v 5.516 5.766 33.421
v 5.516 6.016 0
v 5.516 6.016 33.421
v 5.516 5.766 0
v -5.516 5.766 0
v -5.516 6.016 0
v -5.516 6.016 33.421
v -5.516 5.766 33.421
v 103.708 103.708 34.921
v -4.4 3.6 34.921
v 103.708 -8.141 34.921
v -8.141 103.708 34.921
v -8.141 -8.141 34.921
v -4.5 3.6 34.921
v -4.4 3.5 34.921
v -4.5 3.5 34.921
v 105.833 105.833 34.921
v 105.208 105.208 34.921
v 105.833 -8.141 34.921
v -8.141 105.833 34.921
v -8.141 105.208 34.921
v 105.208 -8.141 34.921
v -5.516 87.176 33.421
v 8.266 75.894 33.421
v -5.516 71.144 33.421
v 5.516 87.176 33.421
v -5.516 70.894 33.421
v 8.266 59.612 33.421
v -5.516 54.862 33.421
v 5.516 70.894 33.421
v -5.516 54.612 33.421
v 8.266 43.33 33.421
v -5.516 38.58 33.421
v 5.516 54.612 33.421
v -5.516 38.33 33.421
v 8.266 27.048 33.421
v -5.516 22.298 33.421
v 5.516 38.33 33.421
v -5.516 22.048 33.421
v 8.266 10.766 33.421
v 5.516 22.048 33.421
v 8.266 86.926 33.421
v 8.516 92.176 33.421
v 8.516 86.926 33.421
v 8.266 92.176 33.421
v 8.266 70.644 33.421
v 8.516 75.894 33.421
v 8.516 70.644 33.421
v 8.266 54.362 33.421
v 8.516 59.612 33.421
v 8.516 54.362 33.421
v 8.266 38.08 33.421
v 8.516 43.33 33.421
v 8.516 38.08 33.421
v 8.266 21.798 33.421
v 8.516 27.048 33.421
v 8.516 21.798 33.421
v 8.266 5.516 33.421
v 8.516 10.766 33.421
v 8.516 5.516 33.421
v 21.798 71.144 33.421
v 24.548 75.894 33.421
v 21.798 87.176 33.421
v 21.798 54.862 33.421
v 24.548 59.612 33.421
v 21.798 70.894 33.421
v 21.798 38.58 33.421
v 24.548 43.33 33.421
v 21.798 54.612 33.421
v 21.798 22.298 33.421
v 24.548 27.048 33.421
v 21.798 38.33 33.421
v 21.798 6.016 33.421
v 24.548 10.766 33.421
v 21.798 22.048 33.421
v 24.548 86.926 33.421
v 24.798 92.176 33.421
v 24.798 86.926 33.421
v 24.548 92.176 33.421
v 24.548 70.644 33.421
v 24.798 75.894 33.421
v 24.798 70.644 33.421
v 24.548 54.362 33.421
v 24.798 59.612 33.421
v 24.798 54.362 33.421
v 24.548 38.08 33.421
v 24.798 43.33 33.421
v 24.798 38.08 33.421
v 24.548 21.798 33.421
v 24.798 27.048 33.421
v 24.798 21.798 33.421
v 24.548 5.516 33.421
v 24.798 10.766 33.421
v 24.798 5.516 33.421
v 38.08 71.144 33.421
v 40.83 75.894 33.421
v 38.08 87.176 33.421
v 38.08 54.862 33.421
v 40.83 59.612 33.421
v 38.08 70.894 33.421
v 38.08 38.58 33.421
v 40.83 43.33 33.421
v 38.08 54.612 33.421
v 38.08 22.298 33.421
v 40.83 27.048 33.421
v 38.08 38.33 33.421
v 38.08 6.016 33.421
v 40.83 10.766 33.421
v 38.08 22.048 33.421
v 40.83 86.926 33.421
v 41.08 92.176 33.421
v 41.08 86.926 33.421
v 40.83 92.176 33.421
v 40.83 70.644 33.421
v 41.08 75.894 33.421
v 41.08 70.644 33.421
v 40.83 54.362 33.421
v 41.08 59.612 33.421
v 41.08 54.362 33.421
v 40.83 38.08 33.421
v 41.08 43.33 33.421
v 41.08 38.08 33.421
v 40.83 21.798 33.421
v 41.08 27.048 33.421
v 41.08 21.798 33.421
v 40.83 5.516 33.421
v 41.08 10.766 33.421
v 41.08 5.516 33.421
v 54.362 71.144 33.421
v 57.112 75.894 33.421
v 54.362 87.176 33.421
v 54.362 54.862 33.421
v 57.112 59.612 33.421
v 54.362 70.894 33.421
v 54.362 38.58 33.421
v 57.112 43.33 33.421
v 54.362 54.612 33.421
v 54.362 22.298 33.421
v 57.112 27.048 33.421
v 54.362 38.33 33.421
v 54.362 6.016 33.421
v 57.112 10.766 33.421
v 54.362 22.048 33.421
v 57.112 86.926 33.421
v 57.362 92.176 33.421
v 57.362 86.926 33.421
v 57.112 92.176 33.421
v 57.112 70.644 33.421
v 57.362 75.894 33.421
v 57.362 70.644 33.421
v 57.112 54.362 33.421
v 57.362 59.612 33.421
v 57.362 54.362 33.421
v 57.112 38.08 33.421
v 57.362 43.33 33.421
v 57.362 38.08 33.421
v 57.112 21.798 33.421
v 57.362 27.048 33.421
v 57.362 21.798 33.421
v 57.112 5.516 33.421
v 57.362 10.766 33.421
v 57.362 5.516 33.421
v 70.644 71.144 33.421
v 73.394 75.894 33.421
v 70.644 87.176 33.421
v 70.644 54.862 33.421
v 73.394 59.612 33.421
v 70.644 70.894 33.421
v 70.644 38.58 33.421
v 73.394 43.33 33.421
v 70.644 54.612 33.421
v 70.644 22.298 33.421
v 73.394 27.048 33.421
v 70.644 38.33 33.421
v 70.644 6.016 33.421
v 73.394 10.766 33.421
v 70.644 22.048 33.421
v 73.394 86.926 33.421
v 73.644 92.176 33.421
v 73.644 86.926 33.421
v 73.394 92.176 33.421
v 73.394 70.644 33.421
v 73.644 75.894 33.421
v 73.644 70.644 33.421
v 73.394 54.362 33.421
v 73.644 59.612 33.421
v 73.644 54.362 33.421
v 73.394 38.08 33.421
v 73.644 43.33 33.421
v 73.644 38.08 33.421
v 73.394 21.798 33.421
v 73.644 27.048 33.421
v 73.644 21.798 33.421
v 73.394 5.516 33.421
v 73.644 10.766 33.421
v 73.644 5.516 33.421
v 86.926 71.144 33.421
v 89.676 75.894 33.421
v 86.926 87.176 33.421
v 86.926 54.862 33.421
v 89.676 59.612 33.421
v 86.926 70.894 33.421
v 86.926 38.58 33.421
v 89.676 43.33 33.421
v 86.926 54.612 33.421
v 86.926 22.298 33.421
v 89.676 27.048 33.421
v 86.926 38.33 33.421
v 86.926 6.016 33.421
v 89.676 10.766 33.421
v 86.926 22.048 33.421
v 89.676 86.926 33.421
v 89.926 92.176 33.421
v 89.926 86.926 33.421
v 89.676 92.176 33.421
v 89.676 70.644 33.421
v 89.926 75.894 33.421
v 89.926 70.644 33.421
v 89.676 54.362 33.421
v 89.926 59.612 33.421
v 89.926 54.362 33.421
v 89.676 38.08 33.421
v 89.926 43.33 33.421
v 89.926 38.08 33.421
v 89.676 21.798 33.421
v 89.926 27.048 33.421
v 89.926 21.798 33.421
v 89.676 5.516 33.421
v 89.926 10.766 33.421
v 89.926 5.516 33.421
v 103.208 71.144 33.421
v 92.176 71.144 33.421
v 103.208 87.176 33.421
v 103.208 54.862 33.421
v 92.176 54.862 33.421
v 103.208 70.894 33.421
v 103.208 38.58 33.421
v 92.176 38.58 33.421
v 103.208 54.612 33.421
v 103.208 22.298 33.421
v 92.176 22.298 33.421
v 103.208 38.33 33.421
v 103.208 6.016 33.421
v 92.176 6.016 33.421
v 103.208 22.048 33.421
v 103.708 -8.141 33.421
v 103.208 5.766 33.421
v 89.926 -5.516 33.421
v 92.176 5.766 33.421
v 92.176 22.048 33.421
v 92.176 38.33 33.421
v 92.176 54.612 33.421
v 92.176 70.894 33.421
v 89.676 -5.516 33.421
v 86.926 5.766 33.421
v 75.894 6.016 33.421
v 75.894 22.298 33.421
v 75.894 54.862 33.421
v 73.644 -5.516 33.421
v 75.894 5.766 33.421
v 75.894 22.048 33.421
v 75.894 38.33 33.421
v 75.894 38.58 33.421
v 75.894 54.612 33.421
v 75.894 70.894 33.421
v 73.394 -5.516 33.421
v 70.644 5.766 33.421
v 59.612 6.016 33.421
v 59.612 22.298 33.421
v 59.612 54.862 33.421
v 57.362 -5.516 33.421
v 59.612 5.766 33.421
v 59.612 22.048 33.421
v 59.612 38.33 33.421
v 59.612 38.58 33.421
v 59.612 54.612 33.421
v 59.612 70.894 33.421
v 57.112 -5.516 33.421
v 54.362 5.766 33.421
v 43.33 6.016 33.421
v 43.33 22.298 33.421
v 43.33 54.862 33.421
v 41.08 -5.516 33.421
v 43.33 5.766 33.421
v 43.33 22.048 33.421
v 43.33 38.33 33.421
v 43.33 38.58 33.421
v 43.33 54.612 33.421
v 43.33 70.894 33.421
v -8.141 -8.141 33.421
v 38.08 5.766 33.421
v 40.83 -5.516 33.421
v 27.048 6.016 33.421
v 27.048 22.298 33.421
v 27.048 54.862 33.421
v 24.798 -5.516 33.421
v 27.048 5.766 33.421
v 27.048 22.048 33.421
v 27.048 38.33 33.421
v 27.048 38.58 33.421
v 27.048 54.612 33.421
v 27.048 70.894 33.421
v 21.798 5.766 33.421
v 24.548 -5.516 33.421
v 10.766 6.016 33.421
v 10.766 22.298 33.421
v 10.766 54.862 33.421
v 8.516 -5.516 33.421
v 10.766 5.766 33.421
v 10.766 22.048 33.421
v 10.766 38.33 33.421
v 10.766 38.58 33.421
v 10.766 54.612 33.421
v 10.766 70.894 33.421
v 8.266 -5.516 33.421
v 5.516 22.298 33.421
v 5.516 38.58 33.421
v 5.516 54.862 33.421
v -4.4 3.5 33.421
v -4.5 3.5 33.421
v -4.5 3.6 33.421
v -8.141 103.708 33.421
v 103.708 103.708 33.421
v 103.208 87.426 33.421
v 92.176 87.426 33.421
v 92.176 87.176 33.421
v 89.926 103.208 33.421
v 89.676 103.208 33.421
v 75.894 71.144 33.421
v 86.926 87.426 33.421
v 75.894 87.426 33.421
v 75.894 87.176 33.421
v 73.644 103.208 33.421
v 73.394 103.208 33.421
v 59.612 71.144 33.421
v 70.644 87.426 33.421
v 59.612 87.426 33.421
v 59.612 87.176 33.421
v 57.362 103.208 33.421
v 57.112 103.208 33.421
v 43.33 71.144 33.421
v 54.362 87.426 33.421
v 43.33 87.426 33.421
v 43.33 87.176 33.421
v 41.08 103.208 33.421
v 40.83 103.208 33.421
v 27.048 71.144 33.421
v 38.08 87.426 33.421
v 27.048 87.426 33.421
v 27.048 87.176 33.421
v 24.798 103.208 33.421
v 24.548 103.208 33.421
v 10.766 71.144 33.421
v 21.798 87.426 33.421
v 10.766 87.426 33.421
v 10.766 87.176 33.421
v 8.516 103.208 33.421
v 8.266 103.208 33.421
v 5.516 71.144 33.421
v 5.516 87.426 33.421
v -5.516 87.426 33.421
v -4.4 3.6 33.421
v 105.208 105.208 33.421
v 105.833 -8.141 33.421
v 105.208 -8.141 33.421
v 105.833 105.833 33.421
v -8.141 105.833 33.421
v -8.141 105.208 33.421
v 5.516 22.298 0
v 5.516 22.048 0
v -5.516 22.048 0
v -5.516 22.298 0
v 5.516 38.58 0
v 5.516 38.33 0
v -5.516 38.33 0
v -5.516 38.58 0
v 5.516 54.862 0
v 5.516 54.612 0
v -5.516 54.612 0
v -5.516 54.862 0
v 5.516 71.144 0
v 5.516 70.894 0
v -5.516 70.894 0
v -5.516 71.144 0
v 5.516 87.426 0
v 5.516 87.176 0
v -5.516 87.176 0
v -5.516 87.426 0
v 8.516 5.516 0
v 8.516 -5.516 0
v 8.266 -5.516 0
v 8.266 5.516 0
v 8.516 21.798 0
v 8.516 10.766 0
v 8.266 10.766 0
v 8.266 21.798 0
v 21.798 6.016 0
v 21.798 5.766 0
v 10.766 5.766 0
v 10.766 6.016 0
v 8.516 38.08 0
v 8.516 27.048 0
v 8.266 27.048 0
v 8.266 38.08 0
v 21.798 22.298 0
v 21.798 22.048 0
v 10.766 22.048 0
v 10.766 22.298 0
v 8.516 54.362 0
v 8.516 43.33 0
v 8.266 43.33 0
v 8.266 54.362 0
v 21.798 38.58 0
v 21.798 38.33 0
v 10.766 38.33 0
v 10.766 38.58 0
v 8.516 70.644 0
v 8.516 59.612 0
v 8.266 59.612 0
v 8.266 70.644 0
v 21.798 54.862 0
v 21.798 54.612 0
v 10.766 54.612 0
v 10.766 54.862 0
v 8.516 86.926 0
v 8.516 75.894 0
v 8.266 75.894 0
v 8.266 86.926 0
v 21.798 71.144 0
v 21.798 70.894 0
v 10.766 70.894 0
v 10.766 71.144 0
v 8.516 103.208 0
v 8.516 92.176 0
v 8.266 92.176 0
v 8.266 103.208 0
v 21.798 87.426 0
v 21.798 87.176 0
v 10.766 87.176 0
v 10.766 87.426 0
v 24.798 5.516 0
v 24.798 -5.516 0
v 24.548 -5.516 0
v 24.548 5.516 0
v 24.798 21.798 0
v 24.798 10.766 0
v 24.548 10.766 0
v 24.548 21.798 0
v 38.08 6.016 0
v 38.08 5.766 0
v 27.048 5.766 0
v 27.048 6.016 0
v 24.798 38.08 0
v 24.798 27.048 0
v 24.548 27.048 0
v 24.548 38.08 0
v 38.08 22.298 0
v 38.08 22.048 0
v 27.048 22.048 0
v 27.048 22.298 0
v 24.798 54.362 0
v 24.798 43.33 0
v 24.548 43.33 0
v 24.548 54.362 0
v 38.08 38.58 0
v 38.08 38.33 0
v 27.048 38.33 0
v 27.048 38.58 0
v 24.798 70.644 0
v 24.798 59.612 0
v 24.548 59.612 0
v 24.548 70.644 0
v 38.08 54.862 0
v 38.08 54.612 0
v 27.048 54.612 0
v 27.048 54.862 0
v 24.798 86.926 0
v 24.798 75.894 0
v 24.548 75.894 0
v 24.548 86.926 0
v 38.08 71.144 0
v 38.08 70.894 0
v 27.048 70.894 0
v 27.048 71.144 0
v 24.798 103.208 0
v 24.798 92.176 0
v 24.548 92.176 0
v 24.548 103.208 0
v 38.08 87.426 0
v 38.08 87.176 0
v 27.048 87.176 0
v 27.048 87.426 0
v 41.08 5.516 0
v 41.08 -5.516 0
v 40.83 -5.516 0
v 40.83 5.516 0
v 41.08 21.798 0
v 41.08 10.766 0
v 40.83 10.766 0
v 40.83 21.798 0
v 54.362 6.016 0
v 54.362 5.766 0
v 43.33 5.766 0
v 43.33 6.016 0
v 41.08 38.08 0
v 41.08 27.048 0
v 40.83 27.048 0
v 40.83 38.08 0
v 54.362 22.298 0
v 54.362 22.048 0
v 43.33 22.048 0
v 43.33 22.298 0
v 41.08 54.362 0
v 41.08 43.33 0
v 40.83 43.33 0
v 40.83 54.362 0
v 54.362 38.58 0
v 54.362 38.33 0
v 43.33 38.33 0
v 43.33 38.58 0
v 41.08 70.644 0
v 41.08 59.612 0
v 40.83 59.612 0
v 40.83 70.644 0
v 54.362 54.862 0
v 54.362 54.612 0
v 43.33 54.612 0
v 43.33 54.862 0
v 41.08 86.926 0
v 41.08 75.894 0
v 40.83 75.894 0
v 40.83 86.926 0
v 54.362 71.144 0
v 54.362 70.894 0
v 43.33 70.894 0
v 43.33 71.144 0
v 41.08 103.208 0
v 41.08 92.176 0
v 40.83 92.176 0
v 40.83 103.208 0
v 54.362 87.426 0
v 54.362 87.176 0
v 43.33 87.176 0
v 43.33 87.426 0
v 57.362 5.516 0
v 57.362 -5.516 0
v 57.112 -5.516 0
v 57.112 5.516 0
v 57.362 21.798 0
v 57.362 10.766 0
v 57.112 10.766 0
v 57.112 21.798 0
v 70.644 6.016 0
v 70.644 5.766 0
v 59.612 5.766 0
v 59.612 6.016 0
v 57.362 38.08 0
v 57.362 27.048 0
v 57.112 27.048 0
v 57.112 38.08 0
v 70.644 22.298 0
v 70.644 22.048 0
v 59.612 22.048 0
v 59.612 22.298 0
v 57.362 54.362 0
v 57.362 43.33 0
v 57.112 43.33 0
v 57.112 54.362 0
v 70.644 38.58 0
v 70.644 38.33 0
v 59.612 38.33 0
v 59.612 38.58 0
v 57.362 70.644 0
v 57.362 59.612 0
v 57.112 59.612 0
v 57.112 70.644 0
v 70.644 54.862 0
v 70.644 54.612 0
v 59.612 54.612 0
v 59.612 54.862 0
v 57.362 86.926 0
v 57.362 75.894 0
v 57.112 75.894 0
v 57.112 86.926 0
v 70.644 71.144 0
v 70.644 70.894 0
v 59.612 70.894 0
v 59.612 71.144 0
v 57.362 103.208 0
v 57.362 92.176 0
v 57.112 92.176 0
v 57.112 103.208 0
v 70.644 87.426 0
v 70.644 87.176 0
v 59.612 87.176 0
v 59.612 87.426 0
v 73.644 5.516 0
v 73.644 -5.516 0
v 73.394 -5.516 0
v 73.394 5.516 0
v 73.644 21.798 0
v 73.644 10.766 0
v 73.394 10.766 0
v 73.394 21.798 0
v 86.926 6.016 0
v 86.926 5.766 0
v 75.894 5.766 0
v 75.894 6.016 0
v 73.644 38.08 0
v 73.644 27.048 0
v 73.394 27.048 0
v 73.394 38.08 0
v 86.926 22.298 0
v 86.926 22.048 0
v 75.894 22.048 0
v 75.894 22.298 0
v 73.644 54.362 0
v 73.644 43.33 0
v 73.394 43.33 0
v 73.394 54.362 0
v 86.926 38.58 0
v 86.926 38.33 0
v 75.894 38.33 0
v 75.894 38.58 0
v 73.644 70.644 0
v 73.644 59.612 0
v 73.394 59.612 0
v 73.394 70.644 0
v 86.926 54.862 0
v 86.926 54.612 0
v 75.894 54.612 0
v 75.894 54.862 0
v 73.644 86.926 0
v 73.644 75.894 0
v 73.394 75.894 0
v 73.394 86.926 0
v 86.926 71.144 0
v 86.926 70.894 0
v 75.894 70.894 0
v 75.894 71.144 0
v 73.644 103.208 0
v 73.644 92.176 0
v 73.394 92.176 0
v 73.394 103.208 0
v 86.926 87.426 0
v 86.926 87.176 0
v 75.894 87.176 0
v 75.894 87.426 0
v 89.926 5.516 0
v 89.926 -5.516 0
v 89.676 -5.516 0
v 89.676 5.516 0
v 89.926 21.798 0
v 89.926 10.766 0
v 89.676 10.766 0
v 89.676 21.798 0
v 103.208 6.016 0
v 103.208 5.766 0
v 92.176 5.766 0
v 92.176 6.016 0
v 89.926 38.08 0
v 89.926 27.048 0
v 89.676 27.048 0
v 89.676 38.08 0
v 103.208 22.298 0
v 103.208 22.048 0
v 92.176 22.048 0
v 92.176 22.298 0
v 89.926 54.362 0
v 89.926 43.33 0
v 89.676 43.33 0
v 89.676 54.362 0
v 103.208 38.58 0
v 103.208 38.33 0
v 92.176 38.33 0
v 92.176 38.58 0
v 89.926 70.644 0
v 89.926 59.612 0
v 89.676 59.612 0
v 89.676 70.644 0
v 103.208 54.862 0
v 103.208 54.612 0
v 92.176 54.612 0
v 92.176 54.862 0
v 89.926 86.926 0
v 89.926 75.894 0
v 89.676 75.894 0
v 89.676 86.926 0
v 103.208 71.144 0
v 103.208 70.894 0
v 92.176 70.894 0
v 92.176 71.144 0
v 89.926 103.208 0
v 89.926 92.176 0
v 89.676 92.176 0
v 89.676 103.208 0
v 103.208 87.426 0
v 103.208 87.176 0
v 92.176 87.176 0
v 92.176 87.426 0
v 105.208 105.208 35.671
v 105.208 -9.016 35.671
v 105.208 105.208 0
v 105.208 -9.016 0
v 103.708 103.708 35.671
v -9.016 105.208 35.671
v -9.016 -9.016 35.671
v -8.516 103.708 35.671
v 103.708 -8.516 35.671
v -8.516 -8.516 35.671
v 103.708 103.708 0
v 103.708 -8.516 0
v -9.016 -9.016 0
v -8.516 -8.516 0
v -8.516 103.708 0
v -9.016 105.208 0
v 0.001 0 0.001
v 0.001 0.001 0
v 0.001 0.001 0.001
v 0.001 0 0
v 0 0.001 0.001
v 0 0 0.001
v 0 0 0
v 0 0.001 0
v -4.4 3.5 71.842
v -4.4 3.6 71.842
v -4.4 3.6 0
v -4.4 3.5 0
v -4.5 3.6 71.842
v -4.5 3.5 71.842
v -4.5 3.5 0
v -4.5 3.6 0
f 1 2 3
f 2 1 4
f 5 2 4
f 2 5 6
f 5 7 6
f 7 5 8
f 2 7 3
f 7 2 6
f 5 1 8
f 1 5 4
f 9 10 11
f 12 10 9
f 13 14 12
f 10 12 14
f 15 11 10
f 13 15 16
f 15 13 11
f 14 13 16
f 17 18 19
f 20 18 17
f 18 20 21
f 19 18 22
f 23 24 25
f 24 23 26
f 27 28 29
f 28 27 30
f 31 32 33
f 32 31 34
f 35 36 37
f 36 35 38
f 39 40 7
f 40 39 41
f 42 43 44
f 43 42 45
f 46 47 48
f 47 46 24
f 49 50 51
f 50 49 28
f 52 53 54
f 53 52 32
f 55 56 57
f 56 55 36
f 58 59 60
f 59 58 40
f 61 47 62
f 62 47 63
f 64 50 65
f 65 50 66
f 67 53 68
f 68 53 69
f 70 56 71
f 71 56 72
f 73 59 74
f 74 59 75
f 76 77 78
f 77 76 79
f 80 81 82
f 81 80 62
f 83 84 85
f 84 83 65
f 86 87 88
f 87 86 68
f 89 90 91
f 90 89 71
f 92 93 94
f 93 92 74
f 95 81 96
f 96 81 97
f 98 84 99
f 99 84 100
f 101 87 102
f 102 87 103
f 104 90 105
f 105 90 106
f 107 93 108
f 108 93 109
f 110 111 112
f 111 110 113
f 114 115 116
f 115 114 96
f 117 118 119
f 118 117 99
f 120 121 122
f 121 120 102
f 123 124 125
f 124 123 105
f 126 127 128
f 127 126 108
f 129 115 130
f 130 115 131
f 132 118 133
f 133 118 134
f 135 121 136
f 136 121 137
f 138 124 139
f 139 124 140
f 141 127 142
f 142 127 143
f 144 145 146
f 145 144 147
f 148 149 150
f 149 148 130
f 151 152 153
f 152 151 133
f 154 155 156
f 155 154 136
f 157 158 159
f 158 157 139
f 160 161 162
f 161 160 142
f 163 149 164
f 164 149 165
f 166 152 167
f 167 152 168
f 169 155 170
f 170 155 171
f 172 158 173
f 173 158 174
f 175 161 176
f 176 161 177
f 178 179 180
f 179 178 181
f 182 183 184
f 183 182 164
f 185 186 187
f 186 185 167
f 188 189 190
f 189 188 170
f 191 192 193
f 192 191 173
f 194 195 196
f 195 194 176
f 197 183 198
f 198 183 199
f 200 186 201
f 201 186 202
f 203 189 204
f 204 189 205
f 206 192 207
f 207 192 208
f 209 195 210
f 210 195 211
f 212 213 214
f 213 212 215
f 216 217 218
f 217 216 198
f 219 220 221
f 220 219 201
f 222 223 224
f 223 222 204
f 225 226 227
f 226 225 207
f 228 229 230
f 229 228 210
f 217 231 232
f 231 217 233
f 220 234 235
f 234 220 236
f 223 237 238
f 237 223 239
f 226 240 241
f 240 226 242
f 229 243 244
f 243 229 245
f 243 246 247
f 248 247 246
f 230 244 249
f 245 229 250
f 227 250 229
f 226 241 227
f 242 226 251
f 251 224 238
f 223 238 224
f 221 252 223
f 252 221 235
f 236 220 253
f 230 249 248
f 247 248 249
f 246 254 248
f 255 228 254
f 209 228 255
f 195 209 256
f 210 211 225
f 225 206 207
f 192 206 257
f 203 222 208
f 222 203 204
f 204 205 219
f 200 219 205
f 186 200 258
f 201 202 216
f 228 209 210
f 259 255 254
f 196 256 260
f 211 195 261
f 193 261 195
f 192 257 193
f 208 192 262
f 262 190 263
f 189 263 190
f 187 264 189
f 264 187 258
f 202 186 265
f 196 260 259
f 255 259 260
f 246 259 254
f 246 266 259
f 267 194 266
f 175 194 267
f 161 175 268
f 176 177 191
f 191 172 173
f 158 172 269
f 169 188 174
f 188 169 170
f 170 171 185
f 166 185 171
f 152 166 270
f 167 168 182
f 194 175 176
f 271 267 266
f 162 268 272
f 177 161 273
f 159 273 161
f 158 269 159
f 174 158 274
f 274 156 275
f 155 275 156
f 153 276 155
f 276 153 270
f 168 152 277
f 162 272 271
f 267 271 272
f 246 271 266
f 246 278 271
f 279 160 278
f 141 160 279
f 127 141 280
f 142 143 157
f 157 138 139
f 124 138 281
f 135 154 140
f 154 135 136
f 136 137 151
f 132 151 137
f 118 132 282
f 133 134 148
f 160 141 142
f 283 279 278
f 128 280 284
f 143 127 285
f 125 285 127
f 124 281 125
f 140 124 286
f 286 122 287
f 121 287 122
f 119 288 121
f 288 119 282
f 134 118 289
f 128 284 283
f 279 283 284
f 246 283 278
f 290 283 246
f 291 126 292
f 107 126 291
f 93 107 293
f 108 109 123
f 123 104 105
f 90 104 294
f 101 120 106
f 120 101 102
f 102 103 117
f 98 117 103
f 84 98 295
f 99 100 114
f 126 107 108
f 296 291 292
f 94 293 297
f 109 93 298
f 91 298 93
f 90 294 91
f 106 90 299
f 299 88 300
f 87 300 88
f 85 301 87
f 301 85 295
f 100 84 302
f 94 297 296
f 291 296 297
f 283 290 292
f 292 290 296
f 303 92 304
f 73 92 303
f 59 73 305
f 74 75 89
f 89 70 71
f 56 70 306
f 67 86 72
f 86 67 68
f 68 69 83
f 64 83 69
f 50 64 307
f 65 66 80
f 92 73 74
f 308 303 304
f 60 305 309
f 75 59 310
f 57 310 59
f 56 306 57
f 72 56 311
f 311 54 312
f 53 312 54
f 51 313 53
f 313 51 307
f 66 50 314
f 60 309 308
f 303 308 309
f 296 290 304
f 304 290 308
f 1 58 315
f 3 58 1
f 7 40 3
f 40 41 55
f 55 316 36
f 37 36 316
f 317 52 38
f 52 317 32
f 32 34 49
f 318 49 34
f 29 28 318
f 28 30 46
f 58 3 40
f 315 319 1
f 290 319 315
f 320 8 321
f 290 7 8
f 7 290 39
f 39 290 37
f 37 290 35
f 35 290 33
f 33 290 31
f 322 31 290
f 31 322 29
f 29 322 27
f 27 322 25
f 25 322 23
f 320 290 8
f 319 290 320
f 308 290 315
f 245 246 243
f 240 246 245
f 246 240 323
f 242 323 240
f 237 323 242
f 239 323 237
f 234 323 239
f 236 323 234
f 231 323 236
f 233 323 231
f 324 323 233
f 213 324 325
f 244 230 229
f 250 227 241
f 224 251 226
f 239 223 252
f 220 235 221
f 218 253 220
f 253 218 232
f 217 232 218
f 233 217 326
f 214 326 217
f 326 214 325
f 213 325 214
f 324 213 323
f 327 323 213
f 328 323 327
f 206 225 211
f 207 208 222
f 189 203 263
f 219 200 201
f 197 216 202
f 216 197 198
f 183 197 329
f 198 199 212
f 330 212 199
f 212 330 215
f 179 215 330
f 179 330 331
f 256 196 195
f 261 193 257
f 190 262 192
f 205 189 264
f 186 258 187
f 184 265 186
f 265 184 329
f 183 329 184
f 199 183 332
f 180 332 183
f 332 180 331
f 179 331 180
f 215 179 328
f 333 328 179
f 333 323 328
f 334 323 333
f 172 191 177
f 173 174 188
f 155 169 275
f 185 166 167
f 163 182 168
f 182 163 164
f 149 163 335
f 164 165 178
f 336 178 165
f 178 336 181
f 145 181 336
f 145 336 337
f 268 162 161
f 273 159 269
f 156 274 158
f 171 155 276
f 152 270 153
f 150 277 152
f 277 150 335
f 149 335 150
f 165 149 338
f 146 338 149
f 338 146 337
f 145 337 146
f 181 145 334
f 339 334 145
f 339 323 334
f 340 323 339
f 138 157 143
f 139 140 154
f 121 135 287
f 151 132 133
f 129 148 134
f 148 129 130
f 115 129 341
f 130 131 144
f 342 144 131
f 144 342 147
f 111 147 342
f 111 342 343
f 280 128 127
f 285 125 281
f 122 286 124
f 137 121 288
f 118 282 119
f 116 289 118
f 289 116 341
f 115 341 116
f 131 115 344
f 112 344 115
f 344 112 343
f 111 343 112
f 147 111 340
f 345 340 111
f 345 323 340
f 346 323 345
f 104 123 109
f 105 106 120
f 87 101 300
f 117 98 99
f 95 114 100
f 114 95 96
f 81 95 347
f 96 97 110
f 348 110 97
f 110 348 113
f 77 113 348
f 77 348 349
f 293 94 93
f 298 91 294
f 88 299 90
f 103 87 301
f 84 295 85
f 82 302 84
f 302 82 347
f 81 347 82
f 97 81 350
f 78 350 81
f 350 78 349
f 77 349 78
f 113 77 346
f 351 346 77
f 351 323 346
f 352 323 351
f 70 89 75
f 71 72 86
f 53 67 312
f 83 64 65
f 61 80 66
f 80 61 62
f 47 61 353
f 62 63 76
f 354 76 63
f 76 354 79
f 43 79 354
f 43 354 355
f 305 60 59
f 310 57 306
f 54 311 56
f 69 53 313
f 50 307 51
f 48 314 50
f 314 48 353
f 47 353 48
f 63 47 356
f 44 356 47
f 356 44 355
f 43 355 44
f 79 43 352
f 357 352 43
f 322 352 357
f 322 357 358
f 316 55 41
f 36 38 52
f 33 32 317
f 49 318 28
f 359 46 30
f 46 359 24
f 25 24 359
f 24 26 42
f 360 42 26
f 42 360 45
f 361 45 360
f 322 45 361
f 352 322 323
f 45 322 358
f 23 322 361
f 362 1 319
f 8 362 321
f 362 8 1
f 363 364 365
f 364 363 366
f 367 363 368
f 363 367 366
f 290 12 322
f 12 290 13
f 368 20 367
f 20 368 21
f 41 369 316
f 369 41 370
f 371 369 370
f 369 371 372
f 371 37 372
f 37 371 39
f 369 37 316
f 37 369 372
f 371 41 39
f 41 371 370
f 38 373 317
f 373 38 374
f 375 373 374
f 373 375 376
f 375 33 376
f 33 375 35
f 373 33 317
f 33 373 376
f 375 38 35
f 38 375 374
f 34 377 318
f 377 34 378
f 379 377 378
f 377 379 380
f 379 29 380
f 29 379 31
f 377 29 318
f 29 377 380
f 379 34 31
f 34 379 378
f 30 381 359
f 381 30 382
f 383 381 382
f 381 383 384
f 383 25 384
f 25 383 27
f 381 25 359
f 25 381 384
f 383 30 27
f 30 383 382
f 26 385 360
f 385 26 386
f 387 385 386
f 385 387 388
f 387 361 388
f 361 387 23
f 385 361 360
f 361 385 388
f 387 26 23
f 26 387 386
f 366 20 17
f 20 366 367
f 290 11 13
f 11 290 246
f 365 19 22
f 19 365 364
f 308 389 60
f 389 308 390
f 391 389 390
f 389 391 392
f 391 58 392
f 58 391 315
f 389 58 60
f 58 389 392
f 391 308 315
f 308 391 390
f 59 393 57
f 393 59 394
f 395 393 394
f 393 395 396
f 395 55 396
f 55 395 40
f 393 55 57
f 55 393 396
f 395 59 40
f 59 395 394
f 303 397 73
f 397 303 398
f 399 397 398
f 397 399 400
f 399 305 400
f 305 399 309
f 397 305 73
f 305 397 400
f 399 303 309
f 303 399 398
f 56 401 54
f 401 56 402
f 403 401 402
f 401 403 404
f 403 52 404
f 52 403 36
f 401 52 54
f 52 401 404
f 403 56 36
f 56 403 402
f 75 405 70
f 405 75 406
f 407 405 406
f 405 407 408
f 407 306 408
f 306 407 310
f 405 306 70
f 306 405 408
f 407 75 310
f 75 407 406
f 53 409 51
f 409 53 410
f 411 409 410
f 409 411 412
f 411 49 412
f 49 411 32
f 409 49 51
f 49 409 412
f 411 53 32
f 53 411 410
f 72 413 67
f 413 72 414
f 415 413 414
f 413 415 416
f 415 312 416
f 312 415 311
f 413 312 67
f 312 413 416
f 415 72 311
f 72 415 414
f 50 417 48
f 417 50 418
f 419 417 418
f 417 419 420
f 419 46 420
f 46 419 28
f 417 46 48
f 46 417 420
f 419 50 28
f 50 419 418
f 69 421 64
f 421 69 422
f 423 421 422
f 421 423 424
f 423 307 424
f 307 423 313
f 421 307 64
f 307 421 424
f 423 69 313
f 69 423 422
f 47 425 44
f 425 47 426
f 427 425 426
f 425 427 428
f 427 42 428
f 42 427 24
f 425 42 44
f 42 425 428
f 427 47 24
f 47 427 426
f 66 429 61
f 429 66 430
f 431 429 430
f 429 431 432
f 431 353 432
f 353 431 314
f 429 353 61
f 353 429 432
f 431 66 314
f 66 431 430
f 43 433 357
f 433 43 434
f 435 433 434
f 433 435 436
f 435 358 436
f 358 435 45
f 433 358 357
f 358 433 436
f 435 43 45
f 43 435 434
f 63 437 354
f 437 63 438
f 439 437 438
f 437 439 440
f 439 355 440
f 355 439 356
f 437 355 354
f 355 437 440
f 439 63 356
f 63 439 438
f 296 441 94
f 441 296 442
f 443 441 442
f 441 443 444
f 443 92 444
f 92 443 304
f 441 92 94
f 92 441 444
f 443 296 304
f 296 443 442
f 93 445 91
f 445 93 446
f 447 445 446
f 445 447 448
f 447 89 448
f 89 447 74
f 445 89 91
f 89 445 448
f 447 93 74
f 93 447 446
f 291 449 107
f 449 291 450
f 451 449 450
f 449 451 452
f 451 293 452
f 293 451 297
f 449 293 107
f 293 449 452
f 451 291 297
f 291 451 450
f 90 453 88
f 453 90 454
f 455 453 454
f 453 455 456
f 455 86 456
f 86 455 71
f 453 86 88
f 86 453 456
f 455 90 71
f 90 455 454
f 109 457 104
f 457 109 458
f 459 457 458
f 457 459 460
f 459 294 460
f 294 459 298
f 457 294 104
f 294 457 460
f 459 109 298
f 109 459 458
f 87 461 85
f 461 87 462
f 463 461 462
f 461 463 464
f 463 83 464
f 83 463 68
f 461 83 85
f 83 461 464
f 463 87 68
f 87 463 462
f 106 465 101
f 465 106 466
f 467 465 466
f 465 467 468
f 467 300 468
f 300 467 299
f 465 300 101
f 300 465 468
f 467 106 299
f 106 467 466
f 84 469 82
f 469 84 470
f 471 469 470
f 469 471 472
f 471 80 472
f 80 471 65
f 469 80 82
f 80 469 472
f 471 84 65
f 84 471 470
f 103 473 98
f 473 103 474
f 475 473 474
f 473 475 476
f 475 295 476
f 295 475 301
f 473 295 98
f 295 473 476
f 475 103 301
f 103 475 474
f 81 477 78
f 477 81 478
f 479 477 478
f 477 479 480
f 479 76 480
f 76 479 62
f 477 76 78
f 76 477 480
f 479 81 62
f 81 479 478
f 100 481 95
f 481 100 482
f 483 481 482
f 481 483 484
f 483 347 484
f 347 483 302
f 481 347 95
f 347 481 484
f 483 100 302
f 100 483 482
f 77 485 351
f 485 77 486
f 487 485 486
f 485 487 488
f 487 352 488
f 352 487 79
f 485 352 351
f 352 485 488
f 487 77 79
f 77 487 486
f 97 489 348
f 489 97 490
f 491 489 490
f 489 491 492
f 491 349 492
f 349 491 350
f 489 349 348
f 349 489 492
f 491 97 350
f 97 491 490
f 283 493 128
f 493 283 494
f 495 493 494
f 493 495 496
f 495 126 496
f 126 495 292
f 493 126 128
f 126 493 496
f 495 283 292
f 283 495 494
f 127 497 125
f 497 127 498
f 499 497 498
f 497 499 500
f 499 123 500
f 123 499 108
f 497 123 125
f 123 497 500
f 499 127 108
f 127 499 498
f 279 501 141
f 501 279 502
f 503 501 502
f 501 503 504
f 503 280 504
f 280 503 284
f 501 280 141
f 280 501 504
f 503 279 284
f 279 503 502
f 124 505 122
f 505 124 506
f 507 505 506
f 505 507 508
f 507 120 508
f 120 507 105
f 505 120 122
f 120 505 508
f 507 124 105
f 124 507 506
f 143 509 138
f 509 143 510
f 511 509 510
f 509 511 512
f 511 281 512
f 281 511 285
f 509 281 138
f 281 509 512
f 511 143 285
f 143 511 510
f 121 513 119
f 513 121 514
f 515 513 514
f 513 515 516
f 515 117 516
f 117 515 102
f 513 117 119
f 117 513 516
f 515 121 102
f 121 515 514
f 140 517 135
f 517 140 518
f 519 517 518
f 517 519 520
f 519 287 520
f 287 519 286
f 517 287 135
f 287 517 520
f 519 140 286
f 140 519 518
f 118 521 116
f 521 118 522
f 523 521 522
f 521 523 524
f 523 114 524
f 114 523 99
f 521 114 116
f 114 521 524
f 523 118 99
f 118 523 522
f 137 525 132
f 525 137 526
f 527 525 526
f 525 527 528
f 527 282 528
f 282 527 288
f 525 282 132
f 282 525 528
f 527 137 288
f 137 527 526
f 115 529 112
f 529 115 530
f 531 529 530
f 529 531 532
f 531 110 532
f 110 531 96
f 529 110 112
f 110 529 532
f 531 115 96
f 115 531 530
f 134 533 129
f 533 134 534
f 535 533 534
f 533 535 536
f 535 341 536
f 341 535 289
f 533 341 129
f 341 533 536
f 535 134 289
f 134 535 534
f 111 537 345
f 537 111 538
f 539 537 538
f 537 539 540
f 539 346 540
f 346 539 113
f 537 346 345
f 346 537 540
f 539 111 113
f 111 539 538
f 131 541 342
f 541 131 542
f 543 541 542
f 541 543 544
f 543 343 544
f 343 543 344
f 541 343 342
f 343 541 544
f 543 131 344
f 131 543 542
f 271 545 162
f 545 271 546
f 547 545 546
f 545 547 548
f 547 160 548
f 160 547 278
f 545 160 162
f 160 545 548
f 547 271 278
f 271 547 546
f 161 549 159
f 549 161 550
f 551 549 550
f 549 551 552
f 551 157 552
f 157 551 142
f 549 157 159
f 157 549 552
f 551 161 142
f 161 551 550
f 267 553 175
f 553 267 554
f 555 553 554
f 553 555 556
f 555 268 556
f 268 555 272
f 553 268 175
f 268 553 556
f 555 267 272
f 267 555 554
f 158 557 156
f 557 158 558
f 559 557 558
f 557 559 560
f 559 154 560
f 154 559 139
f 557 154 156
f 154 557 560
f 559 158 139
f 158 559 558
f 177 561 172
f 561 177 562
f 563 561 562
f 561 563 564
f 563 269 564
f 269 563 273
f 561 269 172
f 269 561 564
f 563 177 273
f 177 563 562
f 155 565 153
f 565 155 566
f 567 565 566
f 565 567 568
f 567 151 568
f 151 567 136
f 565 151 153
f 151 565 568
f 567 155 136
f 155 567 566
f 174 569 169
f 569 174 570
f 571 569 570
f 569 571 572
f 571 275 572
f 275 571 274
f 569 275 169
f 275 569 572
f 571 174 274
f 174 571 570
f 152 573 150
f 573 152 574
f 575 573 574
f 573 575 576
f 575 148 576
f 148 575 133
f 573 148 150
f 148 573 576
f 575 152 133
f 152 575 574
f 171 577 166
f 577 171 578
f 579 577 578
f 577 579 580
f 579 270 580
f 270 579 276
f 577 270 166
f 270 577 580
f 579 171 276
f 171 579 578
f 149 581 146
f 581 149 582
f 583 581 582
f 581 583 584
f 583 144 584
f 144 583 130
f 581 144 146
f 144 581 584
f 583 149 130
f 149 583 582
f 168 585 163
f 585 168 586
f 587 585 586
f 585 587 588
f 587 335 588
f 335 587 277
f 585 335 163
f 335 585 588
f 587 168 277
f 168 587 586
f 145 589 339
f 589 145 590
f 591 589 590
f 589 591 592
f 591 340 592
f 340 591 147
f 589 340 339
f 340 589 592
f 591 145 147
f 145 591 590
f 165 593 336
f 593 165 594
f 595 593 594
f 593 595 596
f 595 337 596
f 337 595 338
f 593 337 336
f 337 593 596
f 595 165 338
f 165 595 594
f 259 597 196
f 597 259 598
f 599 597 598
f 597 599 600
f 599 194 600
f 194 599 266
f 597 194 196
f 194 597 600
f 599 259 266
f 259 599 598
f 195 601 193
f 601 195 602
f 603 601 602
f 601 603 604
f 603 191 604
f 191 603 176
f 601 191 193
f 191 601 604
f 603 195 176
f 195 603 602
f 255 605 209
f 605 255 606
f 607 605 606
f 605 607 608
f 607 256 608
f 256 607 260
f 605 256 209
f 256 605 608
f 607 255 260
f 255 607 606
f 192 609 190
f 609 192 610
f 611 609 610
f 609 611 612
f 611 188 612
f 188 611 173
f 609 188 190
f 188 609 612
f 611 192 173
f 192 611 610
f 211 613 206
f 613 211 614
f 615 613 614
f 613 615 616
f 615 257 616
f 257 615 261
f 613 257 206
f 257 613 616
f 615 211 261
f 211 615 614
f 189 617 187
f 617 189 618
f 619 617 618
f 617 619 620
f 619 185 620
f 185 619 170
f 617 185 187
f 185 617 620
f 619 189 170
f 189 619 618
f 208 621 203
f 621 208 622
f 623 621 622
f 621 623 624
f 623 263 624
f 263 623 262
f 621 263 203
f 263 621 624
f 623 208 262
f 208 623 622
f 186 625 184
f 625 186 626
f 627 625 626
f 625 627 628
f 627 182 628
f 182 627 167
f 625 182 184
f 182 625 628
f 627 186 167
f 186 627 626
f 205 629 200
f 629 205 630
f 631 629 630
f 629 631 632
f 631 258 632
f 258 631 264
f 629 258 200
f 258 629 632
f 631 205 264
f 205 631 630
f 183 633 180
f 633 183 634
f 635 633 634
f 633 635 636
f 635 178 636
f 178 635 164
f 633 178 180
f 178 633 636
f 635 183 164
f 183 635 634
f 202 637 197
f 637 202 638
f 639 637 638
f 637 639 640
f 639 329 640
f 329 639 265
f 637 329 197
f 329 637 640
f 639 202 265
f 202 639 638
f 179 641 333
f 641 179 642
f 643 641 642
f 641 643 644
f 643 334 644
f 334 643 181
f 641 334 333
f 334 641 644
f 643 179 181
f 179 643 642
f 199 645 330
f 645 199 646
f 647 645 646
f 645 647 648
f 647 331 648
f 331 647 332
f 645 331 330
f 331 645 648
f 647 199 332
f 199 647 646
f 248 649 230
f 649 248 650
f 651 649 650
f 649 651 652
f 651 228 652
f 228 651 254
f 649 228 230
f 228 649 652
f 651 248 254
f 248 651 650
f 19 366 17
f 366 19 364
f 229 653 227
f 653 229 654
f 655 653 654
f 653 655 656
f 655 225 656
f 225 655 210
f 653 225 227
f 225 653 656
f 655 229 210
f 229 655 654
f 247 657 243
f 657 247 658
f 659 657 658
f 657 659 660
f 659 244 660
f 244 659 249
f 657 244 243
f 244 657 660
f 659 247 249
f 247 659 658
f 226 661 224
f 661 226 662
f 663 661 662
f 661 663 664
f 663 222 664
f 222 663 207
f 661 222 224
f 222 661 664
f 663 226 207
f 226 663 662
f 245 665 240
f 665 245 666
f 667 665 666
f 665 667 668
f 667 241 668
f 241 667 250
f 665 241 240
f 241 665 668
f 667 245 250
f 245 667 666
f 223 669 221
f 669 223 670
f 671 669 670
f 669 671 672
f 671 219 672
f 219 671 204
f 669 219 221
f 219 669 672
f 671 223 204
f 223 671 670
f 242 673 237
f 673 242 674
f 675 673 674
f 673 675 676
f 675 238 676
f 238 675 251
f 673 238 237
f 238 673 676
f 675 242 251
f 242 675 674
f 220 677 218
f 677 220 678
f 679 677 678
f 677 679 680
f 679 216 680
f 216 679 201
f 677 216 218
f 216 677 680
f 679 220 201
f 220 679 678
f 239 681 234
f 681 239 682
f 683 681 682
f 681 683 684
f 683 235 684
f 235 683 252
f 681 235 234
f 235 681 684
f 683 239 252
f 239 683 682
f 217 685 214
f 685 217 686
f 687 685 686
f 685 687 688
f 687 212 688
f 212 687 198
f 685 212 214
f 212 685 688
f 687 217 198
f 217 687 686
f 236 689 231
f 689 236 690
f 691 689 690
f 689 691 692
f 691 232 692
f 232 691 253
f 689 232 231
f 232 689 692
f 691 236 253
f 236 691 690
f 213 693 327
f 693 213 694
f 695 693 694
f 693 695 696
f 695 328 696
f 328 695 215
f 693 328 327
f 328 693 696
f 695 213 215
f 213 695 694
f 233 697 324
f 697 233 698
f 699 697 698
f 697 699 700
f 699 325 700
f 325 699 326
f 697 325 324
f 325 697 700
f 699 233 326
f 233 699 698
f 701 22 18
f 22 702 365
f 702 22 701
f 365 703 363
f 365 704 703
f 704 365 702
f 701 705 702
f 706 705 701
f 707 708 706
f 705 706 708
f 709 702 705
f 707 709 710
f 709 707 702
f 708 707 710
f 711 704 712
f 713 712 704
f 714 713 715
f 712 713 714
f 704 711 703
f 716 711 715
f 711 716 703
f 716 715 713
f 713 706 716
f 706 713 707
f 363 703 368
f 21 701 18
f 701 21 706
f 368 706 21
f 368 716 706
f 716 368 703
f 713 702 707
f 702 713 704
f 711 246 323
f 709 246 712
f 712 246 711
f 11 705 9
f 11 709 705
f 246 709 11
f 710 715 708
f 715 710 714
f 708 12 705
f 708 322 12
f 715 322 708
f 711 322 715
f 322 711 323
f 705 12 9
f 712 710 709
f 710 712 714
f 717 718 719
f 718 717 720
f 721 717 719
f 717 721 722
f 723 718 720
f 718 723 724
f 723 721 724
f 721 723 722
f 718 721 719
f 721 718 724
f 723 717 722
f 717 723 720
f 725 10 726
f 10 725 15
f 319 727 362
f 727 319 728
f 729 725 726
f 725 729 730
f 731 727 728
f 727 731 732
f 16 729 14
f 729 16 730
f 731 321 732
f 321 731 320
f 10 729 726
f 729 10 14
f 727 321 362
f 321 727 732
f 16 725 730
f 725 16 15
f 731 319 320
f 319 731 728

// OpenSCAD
//## ---- END CONSTANTS---- ##//
// all units in MM

//object information
//   hand-enter size of object, as OpenSCAD cannot calculate this
STL_FILE = "<path to stl file>";
Object_Size_X = 11.032; //size in X
Object_Size_Y = 11.032; //size in Y
Object_Size_Z = 33.771; //size in Z
X_Offset = -4.5; //offset to origin in X
Y_Offset = 3.5; //offset to origin in Y
Z_Offset = 0; //offset to origin in Z

//printer Volume information
Printer_X = 160;
Printer_Y = 160;
Printer_Z = 210;

//Boolean Variables for switching dual extruder or not
SEPARATE_FILES = false; //true for export two files, false for one big file
EXPORT_SUPPORT = true;  //only used if above is 'true': true for printing scaffold, false for the stl duplicates

//Spacing information (keep defaults if unsure)
SIDE_PADDING = 5; //amount of XY space between prints
INNER_WALLS = true; //include inner walls if True (good for objects that dont support the raft
WALL_SIZE = 0.25;//thickness of the walls
PERIMETER_SIZE = 1.0;//thickness of outer perimeter (generally good to make thicker to support rafts)

TOP_PADDING = 0.4; //space above the model and the raft
BOTTOM_PADDING = 0.25; //space below the model and the raft
RAFT_THICKNESS = 1.5; //thickness of the raft. Thicker makes less prone to it falling apart under weight, but more time/material

MANUAL_GRID = false; //if 'false': generates grid based on available printer volume. If 'true': uses numbers below
number_x=7; //number of items in X direction
number_y=7; //number of items in Y direction
number_z=2; //number of items 'stacked' in Z

//## ---- END CONSTANTS---- ##//

// GENERATING PLACEMENT INFORMATION
if(MANUAL_GRID){
  number_x = floor(Printer_X/(Object_Size_X + SIDE_PADDING));
  number_y = floor(Printer_Y/(Object_Size_Y + SIDE_PADDING));
  number_z = floor(Printer_Z/(Object_Size_Z + TOP_PADDING + RAFT_THICKNESS + BOTTOM_PADDING));
}
echo(number_x,number_y,number_z);

//Placing STLs
translate([X_Offset,Y_Offset,Z_Offset]) cube([.1,.1,number_z*(Object_Size_Z+TOP_PADDING+BOTTOM_PADDING+RAFT_THICKNESS)]);//optional cube to trick Cura to thinking all objects are connected
for (x = [0:number_x-1]){
    for (y = [0:number_y-1]){
        for (z = [0:number_z-1]){
            translate([(Object_Size_X+SIDE_PADDING+WALL_SIZE)*x,(Object_Size_Y+SIDE_PADDING+WALL_SIZE)*y,0]){
                z_height = (Object_Size_Z+BOTTOM_PADDING+TOP_PADDING+RAFT_THICKNESS)*z;
                if(!SEPARATE_FILES || !EXPORT_SUPPORT){
                    translate([X_Offset,Y_Offset,Z_Offset+z_height]) import(STL_FILE);
                } 
                if (z>0){
                    if(!SEPARATE_FILES || EXPORT_SUPPORT){
                        translate([0,0,Object_Size_Z*z + BOTTOM_PADDING*(z-1) + TOP_PADDING*z]) cube([Object_Size_X+SIDE_PADDING+WALL_SIZE,Object_Size_Y+SIDE_PADDING+WALL_SIZE,RAFT_THICKNESS],center=true);
                    }
                }
            }
           if(!SEPARATE_FILES || EXPORT_SUPPORT){
               //make inner walls (optional but recommended)
                if(INNER_WALLS && z<number_z-1){
                    translate([(Object_Size_X+SIDE_PADDING+WALL_SIZE)*x,(Object_Size_Y+SIDE_PADDING+WALL_SIZE)*y,(Object_Size_Z+BOTTOM_PADDING+TOP_PADDING+RAFT_THICKNESS)*z]){
                        //X
                        if(x>0){
                            translate([-0.5*Object_Size_X-SIDE_PADDING/2,-0.5*Object_Size_Y,0]) cube([WALL_SIZE,Object_Size_Y,Object_Size_Z+TOP_PADDING+BOTTOM_PADDING]);
                        }
                        //Y
                        if(y>0){
                            translate([-0.5*Object_Size_X,-0.5*Object_Size_Y-SIDE_PADDING,0]) cube([Object_Size_X,WALL_SIZE,Object_Size_Z+TOP_PADDING+BOTTOM_PADDING]);
                        }   
                    }
                }  
            }   
        }
    }
}

//create outer perimeter

if(!SEPARATE_FILES || EXPORT_SUPPORT){
    translate([-0.5*Object_Size_X-SIDE_PADDING/2-PERIMETER_SIZE,-0.5*Object_Size_Y-SIDE_PADDING/2-PERIMETER_SIZE,0]) difference(){
        cube([(Object_Size_X+SIDE_PADDING)*(number_x)+2*PERIMETER_SIZE,(Object_Size_Y+SIDE_PADDING)*(number_y)+2*PERIMETER_SIZE,(Object_Size_Z+TOP_PADDING+RAFT_THICKNESS)*(number_z-1)+BOTTOM_PADDING*(number_z-2)]);
        
        translate([PERIMETER_SIZE/2,PERIMETER_SIZE/2,-1]) cube([(Object_Size_X+SIDE_PADDING)*(number_x),(Object_Size_Y+SIDE_PADDING)*(number_y),(Object_Size_Z+TOP_PADDING+RAFT_THICKNESS)*(number_z-1)+BOTTOM_PADDING*(number_z-2)+1]);
    }
    cube([.001,.001,.001]);
}
